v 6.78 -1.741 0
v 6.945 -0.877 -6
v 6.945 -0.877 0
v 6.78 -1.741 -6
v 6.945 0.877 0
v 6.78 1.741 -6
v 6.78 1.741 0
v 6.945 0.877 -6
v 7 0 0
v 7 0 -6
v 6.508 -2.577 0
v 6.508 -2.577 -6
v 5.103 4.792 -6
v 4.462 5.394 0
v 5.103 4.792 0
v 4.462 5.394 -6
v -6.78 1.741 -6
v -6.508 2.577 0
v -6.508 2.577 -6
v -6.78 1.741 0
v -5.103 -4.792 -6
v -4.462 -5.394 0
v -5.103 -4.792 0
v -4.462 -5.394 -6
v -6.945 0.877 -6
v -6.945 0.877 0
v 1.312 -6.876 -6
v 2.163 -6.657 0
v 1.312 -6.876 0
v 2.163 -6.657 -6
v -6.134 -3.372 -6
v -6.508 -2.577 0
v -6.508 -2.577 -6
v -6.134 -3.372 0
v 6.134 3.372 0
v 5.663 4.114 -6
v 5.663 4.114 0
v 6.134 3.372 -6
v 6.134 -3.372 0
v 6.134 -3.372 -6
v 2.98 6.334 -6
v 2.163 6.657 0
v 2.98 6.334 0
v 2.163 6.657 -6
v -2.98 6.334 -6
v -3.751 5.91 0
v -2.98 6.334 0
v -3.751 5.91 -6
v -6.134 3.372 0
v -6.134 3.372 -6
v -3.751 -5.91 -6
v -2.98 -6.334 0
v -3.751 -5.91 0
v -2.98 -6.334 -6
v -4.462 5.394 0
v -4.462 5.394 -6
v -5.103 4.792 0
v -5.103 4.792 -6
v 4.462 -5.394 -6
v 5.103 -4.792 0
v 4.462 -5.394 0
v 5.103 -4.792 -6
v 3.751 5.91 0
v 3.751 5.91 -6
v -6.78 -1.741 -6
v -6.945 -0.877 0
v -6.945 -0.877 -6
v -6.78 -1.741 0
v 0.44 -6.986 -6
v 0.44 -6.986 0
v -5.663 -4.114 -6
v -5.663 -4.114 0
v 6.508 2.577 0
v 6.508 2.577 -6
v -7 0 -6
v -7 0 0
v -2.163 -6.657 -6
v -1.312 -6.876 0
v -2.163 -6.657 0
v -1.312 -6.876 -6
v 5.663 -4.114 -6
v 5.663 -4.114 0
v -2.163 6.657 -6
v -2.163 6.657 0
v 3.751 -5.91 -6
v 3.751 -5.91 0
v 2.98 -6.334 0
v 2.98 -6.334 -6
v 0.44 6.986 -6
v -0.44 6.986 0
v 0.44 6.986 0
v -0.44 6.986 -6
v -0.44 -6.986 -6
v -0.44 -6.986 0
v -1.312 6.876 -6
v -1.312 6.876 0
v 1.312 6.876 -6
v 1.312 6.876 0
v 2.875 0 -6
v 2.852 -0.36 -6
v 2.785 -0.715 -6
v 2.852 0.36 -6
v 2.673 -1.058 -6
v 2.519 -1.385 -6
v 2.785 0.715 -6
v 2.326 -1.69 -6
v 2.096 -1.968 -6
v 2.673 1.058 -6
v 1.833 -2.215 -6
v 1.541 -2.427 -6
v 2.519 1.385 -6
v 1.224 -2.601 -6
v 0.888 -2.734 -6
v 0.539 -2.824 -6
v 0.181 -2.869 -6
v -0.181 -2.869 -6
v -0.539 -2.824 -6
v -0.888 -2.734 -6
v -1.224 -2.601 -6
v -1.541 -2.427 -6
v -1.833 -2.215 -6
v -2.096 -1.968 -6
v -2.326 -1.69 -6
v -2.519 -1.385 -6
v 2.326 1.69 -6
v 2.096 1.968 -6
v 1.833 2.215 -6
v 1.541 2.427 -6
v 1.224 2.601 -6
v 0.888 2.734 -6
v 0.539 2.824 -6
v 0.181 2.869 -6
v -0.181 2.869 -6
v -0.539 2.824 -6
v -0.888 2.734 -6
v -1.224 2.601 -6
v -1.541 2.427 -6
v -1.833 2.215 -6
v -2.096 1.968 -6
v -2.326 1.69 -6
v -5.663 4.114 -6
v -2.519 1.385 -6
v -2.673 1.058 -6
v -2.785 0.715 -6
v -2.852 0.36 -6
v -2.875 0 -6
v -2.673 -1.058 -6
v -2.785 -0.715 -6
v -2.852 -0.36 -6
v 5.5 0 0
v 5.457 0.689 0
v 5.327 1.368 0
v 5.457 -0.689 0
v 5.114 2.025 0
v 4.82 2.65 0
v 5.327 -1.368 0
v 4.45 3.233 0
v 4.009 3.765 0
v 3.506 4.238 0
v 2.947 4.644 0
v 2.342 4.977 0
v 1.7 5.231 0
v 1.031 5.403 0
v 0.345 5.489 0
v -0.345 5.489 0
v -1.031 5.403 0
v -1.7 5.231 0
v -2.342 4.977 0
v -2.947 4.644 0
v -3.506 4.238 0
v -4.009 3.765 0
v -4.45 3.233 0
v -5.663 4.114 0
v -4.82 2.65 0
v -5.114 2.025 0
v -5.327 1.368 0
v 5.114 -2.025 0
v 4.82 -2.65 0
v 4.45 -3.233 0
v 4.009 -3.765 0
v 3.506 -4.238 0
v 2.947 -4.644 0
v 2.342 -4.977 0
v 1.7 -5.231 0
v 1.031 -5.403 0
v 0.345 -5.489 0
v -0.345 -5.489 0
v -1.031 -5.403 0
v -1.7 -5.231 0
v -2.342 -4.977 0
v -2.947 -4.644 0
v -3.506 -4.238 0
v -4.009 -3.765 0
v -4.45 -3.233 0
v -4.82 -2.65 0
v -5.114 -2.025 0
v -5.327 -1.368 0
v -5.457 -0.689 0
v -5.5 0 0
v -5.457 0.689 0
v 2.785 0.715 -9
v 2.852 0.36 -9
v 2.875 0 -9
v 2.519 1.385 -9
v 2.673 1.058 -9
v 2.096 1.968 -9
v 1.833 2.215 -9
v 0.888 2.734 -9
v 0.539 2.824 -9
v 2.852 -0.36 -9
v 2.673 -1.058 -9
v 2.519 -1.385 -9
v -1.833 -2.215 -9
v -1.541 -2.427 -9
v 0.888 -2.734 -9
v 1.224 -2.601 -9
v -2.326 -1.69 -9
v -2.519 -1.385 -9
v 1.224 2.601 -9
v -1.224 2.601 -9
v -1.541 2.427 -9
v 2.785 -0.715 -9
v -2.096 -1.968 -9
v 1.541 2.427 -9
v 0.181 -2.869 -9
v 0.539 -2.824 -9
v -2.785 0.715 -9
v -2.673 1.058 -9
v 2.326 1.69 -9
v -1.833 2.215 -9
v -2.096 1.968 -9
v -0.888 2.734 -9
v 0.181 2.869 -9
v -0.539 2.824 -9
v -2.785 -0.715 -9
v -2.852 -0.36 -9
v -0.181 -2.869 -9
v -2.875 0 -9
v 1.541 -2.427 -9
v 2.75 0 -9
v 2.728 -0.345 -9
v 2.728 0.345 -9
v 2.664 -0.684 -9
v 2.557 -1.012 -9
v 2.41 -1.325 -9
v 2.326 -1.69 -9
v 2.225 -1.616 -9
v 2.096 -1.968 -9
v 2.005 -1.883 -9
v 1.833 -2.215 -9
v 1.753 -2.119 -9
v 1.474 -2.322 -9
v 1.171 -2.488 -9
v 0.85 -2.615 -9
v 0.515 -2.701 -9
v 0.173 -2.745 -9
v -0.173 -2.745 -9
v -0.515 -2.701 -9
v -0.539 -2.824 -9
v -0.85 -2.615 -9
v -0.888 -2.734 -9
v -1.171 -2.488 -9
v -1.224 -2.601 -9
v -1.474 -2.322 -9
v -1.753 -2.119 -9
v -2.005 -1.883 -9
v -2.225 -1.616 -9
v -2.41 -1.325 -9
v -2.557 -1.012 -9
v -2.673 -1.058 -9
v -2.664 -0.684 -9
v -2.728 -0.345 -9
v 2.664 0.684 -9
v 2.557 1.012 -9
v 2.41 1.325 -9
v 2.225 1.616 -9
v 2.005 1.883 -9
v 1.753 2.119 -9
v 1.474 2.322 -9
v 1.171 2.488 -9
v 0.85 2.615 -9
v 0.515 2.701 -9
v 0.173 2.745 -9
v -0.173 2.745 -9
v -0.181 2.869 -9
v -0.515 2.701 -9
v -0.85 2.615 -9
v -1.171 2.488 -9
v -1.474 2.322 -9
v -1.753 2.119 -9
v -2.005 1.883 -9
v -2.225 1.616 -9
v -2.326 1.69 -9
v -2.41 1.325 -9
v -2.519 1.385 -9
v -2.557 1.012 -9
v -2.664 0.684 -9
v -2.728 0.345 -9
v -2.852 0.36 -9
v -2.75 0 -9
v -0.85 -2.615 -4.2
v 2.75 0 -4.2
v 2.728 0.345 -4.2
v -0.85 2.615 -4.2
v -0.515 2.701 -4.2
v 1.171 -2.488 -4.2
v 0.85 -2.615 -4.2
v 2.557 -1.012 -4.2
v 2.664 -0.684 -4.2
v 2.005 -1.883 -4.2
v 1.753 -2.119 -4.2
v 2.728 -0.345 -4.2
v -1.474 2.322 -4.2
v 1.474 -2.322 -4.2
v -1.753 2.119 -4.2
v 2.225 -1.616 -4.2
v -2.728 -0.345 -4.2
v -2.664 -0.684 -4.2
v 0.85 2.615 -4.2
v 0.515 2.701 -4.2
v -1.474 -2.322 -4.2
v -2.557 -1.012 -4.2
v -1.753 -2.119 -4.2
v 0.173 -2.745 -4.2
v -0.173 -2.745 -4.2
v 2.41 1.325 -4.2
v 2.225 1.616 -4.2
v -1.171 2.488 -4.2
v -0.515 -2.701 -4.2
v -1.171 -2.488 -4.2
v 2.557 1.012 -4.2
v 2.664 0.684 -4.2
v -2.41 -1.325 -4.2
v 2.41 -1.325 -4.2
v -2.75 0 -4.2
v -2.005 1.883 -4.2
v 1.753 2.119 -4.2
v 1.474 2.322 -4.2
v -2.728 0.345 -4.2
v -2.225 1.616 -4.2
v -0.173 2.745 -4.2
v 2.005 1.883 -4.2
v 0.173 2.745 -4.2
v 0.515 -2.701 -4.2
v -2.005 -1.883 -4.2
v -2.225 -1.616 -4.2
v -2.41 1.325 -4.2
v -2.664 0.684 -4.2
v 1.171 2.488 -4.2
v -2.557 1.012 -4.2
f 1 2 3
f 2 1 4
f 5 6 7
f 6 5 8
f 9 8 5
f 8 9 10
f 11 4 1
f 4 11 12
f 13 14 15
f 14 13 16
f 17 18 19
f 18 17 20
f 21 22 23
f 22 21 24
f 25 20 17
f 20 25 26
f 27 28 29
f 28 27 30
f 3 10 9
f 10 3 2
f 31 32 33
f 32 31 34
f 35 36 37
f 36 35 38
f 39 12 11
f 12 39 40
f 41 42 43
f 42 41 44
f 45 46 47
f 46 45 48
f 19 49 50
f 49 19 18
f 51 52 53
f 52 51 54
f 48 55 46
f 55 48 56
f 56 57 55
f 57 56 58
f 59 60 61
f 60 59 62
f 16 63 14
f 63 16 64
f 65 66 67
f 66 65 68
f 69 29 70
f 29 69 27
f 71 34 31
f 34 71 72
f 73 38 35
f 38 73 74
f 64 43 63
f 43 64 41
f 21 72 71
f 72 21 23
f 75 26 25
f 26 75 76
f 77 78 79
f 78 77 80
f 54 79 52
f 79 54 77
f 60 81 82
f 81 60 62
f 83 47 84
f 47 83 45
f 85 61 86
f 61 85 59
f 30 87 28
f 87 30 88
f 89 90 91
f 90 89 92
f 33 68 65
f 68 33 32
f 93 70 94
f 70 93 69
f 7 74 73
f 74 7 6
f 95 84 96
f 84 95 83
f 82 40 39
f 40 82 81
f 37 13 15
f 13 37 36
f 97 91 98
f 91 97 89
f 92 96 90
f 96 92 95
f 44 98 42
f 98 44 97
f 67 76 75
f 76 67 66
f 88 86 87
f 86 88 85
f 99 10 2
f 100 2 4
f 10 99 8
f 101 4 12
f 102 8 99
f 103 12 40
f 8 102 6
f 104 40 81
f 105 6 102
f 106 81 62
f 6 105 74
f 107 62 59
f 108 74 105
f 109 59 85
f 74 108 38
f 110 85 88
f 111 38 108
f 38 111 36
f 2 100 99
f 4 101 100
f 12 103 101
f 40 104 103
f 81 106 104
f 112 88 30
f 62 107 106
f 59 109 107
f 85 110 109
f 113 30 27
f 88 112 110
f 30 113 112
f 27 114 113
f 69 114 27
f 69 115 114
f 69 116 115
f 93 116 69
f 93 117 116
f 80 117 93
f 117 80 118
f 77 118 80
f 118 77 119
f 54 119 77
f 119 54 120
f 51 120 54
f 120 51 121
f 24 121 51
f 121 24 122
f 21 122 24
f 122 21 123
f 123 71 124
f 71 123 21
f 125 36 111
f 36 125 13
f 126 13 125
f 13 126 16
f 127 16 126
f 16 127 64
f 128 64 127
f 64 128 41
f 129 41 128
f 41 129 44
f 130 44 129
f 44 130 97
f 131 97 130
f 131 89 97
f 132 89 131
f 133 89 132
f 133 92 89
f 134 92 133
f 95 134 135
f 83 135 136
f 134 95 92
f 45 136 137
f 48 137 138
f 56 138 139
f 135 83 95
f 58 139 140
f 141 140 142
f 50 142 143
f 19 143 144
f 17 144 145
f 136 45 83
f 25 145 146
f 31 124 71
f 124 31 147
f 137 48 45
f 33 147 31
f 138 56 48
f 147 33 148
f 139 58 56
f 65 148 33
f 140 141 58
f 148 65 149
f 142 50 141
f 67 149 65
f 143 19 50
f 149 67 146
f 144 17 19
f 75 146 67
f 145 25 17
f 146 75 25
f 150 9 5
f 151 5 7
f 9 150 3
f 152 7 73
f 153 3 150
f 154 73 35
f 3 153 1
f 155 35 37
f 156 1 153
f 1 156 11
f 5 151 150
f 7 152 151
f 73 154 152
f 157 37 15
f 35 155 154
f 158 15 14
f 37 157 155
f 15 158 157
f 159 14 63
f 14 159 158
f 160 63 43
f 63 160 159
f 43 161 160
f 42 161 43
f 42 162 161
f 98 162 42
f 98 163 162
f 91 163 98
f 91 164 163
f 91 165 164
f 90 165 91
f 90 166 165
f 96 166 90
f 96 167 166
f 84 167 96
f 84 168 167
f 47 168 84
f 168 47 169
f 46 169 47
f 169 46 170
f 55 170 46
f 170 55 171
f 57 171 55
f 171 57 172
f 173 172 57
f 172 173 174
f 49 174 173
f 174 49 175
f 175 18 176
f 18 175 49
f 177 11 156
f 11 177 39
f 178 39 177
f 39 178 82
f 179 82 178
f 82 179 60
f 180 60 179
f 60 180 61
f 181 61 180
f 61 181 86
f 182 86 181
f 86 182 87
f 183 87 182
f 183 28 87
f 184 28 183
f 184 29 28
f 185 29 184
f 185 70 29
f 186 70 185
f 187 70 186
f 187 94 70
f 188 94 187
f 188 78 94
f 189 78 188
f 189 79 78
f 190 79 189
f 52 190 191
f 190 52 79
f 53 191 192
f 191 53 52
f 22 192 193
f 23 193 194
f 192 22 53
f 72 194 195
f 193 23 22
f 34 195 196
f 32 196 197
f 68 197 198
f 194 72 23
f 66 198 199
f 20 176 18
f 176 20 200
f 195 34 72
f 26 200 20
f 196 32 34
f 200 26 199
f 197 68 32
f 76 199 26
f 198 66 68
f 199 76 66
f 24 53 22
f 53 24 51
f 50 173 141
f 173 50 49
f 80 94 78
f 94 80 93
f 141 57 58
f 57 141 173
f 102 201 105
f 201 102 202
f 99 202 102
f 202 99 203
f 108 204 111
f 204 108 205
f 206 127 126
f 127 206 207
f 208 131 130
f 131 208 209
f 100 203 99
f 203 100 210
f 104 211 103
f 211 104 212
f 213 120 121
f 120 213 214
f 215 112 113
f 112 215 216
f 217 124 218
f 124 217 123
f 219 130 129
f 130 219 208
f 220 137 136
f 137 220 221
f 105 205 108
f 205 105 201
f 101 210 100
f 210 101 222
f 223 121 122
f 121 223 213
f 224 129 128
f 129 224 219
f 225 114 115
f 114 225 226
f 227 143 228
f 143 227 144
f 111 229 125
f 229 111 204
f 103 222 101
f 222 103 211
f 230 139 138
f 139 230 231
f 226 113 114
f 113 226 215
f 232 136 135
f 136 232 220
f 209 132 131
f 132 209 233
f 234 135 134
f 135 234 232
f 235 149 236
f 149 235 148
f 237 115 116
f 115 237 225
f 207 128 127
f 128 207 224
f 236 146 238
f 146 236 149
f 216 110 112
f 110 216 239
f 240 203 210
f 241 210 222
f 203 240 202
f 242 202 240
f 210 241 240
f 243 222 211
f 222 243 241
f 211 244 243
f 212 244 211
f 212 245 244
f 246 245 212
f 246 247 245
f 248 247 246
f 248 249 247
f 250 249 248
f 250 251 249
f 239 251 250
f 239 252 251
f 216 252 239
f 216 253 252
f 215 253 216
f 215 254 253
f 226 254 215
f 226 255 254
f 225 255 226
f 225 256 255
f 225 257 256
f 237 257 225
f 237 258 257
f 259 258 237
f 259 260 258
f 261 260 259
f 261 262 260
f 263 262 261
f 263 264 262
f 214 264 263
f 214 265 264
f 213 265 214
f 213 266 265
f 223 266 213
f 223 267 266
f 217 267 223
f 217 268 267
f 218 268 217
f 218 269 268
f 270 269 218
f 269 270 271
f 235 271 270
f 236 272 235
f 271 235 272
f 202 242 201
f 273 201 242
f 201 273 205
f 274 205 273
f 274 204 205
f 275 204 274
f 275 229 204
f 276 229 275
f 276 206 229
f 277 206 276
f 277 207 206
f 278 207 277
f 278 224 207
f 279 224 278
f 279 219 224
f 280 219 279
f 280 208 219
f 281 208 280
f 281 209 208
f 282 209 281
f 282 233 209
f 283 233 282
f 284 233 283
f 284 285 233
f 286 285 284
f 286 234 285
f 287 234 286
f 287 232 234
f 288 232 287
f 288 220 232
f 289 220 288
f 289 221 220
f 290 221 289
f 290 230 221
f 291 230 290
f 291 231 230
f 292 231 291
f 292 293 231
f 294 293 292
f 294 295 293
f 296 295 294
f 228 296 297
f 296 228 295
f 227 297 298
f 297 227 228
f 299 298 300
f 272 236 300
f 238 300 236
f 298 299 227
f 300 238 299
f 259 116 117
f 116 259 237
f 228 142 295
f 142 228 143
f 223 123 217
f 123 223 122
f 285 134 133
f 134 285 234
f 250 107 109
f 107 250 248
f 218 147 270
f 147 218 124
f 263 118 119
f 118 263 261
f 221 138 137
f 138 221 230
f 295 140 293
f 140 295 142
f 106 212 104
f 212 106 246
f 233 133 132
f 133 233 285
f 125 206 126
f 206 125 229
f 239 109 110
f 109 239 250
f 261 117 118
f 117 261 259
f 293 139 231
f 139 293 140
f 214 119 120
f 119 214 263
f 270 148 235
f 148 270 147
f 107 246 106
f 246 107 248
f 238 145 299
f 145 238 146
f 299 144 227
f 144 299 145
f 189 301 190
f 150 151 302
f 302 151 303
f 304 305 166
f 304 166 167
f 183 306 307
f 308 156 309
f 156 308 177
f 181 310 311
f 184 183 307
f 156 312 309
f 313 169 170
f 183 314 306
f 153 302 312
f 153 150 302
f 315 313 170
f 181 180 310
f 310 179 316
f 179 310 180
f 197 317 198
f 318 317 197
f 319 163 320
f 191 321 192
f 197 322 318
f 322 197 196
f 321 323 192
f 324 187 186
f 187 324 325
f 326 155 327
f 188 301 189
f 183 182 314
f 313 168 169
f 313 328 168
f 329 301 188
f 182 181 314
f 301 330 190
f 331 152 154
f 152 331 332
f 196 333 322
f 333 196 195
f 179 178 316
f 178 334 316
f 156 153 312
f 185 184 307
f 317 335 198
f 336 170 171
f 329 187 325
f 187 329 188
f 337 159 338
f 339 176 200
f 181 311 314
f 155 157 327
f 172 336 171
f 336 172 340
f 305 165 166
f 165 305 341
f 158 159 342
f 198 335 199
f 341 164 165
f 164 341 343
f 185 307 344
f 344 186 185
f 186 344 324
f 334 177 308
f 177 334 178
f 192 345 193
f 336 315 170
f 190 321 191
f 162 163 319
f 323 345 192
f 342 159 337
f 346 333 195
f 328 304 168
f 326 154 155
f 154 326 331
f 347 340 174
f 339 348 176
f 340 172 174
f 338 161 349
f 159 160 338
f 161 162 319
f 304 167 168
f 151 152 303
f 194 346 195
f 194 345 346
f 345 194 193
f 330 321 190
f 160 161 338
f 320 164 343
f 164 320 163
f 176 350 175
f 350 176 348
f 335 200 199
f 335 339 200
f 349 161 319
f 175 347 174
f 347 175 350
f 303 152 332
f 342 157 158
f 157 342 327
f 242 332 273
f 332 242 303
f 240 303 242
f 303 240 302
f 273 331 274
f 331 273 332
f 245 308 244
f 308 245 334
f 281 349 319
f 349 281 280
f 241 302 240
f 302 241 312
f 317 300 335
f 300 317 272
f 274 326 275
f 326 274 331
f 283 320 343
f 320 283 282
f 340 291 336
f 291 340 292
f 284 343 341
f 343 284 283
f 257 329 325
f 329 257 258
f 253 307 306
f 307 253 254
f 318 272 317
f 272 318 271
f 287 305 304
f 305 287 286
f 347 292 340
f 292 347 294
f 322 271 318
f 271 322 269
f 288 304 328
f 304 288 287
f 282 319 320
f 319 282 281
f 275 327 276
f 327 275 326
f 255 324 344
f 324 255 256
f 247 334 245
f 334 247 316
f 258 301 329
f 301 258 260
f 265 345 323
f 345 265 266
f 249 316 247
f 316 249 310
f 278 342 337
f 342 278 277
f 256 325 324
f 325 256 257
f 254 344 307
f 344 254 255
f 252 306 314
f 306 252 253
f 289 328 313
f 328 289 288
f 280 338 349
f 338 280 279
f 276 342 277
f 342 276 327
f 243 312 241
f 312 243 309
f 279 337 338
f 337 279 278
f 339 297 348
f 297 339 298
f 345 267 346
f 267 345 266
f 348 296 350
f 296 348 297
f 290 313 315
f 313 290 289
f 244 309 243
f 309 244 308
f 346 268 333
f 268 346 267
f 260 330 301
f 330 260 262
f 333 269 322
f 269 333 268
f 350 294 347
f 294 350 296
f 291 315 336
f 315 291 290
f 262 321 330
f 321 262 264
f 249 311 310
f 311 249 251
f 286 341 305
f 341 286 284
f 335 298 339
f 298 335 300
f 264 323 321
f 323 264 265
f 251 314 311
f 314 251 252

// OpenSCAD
$fn = 50;

difference() {
	union() {
		translate(v = [0, 0, -6.0]) {
			cylinder(h = 6, r = 7.0);
		}
		#translate(v = [0, 0, -9.0]) {
			cylinder(h = 9, r = 2.875);
		}
	}
	union() {
		translate(v = [0, 0, 0]) {
			rotate(a = [0, 0, 0]) {
				difference() {
					union() {
						translate(v = [0, 0, -9.0]) {
							cylinder(h = 9, r = 2.25);
						}
						translate(v = [0, 0, -4.2]) {
							cylinder(h = 4.2, r1 = 2.75, r2 = 5.5);
						}
						translate(v = [0, 0, -9.0]) {
							cylinder(h = 9, r = 2.75);
						}
						translate(v = [0, 0, -9.0]) {
							cylinder(h = 9, r = 2.25);
						}
					}
					union();
				}
			}
		}
	}
}
